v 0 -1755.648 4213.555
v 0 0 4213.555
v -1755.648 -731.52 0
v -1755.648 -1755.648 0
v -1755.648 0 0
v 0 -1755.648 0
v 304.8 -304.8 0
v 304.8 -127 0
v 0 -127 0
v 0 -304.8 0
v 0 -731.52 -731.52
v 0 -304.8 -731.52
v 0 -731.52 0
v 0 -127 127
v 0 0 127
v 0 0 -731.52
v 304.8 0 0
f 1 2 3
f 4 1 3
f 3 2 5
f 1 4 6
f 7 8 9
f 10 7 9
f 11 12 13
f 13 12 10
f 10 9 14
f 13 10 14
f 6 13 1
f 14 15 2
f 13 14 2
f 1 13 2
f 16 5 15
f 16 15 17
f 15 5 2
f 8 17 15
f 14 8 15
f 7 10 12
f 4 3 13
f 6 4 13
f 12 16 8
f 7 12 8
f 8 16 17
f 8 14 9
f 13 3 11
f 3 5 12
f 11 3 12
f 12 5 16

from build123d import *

# Parameters (mm, degrees)
F1_DEPTH = 127
F3_DEPTH = 304.8
F5_DEPTH = 731.52
F7_DEPTH = 1755.648


with BuildPart() as f1:
    # F0 (on Front) → F1 (new body)
    with BuildSketch(Plane.XZ):
        Polygon((0, 127), (0, 0), (304.8, 0), align=None)
    extrude(amount=F1_DEPTH)

    # F2 (on Front) → F3 (join)
    with BuildSketch(Plane.XZ):
        Polygon((304.8, 0), (0, 0), (0, -731.52), align=None)
    extrude(amount=F3_DEPTH)

    # F4 (on Front) → F5 (join)
    with BuildSketch(Plane.XZ):
        Polygon((-1755.648, 0), (0, -731.52), (0, 0), align=None)
    extrude(amount=F5_DEPTH)

    # F6 (on Front) → F7 (join)
    with BuildSketch(Plane.XZ):
        Polygon((-1755.648, 0), (0, 0), (0, 4213.5552), align=None)
    extrude(amount=F7_DEPTH)


solid = f1.part
